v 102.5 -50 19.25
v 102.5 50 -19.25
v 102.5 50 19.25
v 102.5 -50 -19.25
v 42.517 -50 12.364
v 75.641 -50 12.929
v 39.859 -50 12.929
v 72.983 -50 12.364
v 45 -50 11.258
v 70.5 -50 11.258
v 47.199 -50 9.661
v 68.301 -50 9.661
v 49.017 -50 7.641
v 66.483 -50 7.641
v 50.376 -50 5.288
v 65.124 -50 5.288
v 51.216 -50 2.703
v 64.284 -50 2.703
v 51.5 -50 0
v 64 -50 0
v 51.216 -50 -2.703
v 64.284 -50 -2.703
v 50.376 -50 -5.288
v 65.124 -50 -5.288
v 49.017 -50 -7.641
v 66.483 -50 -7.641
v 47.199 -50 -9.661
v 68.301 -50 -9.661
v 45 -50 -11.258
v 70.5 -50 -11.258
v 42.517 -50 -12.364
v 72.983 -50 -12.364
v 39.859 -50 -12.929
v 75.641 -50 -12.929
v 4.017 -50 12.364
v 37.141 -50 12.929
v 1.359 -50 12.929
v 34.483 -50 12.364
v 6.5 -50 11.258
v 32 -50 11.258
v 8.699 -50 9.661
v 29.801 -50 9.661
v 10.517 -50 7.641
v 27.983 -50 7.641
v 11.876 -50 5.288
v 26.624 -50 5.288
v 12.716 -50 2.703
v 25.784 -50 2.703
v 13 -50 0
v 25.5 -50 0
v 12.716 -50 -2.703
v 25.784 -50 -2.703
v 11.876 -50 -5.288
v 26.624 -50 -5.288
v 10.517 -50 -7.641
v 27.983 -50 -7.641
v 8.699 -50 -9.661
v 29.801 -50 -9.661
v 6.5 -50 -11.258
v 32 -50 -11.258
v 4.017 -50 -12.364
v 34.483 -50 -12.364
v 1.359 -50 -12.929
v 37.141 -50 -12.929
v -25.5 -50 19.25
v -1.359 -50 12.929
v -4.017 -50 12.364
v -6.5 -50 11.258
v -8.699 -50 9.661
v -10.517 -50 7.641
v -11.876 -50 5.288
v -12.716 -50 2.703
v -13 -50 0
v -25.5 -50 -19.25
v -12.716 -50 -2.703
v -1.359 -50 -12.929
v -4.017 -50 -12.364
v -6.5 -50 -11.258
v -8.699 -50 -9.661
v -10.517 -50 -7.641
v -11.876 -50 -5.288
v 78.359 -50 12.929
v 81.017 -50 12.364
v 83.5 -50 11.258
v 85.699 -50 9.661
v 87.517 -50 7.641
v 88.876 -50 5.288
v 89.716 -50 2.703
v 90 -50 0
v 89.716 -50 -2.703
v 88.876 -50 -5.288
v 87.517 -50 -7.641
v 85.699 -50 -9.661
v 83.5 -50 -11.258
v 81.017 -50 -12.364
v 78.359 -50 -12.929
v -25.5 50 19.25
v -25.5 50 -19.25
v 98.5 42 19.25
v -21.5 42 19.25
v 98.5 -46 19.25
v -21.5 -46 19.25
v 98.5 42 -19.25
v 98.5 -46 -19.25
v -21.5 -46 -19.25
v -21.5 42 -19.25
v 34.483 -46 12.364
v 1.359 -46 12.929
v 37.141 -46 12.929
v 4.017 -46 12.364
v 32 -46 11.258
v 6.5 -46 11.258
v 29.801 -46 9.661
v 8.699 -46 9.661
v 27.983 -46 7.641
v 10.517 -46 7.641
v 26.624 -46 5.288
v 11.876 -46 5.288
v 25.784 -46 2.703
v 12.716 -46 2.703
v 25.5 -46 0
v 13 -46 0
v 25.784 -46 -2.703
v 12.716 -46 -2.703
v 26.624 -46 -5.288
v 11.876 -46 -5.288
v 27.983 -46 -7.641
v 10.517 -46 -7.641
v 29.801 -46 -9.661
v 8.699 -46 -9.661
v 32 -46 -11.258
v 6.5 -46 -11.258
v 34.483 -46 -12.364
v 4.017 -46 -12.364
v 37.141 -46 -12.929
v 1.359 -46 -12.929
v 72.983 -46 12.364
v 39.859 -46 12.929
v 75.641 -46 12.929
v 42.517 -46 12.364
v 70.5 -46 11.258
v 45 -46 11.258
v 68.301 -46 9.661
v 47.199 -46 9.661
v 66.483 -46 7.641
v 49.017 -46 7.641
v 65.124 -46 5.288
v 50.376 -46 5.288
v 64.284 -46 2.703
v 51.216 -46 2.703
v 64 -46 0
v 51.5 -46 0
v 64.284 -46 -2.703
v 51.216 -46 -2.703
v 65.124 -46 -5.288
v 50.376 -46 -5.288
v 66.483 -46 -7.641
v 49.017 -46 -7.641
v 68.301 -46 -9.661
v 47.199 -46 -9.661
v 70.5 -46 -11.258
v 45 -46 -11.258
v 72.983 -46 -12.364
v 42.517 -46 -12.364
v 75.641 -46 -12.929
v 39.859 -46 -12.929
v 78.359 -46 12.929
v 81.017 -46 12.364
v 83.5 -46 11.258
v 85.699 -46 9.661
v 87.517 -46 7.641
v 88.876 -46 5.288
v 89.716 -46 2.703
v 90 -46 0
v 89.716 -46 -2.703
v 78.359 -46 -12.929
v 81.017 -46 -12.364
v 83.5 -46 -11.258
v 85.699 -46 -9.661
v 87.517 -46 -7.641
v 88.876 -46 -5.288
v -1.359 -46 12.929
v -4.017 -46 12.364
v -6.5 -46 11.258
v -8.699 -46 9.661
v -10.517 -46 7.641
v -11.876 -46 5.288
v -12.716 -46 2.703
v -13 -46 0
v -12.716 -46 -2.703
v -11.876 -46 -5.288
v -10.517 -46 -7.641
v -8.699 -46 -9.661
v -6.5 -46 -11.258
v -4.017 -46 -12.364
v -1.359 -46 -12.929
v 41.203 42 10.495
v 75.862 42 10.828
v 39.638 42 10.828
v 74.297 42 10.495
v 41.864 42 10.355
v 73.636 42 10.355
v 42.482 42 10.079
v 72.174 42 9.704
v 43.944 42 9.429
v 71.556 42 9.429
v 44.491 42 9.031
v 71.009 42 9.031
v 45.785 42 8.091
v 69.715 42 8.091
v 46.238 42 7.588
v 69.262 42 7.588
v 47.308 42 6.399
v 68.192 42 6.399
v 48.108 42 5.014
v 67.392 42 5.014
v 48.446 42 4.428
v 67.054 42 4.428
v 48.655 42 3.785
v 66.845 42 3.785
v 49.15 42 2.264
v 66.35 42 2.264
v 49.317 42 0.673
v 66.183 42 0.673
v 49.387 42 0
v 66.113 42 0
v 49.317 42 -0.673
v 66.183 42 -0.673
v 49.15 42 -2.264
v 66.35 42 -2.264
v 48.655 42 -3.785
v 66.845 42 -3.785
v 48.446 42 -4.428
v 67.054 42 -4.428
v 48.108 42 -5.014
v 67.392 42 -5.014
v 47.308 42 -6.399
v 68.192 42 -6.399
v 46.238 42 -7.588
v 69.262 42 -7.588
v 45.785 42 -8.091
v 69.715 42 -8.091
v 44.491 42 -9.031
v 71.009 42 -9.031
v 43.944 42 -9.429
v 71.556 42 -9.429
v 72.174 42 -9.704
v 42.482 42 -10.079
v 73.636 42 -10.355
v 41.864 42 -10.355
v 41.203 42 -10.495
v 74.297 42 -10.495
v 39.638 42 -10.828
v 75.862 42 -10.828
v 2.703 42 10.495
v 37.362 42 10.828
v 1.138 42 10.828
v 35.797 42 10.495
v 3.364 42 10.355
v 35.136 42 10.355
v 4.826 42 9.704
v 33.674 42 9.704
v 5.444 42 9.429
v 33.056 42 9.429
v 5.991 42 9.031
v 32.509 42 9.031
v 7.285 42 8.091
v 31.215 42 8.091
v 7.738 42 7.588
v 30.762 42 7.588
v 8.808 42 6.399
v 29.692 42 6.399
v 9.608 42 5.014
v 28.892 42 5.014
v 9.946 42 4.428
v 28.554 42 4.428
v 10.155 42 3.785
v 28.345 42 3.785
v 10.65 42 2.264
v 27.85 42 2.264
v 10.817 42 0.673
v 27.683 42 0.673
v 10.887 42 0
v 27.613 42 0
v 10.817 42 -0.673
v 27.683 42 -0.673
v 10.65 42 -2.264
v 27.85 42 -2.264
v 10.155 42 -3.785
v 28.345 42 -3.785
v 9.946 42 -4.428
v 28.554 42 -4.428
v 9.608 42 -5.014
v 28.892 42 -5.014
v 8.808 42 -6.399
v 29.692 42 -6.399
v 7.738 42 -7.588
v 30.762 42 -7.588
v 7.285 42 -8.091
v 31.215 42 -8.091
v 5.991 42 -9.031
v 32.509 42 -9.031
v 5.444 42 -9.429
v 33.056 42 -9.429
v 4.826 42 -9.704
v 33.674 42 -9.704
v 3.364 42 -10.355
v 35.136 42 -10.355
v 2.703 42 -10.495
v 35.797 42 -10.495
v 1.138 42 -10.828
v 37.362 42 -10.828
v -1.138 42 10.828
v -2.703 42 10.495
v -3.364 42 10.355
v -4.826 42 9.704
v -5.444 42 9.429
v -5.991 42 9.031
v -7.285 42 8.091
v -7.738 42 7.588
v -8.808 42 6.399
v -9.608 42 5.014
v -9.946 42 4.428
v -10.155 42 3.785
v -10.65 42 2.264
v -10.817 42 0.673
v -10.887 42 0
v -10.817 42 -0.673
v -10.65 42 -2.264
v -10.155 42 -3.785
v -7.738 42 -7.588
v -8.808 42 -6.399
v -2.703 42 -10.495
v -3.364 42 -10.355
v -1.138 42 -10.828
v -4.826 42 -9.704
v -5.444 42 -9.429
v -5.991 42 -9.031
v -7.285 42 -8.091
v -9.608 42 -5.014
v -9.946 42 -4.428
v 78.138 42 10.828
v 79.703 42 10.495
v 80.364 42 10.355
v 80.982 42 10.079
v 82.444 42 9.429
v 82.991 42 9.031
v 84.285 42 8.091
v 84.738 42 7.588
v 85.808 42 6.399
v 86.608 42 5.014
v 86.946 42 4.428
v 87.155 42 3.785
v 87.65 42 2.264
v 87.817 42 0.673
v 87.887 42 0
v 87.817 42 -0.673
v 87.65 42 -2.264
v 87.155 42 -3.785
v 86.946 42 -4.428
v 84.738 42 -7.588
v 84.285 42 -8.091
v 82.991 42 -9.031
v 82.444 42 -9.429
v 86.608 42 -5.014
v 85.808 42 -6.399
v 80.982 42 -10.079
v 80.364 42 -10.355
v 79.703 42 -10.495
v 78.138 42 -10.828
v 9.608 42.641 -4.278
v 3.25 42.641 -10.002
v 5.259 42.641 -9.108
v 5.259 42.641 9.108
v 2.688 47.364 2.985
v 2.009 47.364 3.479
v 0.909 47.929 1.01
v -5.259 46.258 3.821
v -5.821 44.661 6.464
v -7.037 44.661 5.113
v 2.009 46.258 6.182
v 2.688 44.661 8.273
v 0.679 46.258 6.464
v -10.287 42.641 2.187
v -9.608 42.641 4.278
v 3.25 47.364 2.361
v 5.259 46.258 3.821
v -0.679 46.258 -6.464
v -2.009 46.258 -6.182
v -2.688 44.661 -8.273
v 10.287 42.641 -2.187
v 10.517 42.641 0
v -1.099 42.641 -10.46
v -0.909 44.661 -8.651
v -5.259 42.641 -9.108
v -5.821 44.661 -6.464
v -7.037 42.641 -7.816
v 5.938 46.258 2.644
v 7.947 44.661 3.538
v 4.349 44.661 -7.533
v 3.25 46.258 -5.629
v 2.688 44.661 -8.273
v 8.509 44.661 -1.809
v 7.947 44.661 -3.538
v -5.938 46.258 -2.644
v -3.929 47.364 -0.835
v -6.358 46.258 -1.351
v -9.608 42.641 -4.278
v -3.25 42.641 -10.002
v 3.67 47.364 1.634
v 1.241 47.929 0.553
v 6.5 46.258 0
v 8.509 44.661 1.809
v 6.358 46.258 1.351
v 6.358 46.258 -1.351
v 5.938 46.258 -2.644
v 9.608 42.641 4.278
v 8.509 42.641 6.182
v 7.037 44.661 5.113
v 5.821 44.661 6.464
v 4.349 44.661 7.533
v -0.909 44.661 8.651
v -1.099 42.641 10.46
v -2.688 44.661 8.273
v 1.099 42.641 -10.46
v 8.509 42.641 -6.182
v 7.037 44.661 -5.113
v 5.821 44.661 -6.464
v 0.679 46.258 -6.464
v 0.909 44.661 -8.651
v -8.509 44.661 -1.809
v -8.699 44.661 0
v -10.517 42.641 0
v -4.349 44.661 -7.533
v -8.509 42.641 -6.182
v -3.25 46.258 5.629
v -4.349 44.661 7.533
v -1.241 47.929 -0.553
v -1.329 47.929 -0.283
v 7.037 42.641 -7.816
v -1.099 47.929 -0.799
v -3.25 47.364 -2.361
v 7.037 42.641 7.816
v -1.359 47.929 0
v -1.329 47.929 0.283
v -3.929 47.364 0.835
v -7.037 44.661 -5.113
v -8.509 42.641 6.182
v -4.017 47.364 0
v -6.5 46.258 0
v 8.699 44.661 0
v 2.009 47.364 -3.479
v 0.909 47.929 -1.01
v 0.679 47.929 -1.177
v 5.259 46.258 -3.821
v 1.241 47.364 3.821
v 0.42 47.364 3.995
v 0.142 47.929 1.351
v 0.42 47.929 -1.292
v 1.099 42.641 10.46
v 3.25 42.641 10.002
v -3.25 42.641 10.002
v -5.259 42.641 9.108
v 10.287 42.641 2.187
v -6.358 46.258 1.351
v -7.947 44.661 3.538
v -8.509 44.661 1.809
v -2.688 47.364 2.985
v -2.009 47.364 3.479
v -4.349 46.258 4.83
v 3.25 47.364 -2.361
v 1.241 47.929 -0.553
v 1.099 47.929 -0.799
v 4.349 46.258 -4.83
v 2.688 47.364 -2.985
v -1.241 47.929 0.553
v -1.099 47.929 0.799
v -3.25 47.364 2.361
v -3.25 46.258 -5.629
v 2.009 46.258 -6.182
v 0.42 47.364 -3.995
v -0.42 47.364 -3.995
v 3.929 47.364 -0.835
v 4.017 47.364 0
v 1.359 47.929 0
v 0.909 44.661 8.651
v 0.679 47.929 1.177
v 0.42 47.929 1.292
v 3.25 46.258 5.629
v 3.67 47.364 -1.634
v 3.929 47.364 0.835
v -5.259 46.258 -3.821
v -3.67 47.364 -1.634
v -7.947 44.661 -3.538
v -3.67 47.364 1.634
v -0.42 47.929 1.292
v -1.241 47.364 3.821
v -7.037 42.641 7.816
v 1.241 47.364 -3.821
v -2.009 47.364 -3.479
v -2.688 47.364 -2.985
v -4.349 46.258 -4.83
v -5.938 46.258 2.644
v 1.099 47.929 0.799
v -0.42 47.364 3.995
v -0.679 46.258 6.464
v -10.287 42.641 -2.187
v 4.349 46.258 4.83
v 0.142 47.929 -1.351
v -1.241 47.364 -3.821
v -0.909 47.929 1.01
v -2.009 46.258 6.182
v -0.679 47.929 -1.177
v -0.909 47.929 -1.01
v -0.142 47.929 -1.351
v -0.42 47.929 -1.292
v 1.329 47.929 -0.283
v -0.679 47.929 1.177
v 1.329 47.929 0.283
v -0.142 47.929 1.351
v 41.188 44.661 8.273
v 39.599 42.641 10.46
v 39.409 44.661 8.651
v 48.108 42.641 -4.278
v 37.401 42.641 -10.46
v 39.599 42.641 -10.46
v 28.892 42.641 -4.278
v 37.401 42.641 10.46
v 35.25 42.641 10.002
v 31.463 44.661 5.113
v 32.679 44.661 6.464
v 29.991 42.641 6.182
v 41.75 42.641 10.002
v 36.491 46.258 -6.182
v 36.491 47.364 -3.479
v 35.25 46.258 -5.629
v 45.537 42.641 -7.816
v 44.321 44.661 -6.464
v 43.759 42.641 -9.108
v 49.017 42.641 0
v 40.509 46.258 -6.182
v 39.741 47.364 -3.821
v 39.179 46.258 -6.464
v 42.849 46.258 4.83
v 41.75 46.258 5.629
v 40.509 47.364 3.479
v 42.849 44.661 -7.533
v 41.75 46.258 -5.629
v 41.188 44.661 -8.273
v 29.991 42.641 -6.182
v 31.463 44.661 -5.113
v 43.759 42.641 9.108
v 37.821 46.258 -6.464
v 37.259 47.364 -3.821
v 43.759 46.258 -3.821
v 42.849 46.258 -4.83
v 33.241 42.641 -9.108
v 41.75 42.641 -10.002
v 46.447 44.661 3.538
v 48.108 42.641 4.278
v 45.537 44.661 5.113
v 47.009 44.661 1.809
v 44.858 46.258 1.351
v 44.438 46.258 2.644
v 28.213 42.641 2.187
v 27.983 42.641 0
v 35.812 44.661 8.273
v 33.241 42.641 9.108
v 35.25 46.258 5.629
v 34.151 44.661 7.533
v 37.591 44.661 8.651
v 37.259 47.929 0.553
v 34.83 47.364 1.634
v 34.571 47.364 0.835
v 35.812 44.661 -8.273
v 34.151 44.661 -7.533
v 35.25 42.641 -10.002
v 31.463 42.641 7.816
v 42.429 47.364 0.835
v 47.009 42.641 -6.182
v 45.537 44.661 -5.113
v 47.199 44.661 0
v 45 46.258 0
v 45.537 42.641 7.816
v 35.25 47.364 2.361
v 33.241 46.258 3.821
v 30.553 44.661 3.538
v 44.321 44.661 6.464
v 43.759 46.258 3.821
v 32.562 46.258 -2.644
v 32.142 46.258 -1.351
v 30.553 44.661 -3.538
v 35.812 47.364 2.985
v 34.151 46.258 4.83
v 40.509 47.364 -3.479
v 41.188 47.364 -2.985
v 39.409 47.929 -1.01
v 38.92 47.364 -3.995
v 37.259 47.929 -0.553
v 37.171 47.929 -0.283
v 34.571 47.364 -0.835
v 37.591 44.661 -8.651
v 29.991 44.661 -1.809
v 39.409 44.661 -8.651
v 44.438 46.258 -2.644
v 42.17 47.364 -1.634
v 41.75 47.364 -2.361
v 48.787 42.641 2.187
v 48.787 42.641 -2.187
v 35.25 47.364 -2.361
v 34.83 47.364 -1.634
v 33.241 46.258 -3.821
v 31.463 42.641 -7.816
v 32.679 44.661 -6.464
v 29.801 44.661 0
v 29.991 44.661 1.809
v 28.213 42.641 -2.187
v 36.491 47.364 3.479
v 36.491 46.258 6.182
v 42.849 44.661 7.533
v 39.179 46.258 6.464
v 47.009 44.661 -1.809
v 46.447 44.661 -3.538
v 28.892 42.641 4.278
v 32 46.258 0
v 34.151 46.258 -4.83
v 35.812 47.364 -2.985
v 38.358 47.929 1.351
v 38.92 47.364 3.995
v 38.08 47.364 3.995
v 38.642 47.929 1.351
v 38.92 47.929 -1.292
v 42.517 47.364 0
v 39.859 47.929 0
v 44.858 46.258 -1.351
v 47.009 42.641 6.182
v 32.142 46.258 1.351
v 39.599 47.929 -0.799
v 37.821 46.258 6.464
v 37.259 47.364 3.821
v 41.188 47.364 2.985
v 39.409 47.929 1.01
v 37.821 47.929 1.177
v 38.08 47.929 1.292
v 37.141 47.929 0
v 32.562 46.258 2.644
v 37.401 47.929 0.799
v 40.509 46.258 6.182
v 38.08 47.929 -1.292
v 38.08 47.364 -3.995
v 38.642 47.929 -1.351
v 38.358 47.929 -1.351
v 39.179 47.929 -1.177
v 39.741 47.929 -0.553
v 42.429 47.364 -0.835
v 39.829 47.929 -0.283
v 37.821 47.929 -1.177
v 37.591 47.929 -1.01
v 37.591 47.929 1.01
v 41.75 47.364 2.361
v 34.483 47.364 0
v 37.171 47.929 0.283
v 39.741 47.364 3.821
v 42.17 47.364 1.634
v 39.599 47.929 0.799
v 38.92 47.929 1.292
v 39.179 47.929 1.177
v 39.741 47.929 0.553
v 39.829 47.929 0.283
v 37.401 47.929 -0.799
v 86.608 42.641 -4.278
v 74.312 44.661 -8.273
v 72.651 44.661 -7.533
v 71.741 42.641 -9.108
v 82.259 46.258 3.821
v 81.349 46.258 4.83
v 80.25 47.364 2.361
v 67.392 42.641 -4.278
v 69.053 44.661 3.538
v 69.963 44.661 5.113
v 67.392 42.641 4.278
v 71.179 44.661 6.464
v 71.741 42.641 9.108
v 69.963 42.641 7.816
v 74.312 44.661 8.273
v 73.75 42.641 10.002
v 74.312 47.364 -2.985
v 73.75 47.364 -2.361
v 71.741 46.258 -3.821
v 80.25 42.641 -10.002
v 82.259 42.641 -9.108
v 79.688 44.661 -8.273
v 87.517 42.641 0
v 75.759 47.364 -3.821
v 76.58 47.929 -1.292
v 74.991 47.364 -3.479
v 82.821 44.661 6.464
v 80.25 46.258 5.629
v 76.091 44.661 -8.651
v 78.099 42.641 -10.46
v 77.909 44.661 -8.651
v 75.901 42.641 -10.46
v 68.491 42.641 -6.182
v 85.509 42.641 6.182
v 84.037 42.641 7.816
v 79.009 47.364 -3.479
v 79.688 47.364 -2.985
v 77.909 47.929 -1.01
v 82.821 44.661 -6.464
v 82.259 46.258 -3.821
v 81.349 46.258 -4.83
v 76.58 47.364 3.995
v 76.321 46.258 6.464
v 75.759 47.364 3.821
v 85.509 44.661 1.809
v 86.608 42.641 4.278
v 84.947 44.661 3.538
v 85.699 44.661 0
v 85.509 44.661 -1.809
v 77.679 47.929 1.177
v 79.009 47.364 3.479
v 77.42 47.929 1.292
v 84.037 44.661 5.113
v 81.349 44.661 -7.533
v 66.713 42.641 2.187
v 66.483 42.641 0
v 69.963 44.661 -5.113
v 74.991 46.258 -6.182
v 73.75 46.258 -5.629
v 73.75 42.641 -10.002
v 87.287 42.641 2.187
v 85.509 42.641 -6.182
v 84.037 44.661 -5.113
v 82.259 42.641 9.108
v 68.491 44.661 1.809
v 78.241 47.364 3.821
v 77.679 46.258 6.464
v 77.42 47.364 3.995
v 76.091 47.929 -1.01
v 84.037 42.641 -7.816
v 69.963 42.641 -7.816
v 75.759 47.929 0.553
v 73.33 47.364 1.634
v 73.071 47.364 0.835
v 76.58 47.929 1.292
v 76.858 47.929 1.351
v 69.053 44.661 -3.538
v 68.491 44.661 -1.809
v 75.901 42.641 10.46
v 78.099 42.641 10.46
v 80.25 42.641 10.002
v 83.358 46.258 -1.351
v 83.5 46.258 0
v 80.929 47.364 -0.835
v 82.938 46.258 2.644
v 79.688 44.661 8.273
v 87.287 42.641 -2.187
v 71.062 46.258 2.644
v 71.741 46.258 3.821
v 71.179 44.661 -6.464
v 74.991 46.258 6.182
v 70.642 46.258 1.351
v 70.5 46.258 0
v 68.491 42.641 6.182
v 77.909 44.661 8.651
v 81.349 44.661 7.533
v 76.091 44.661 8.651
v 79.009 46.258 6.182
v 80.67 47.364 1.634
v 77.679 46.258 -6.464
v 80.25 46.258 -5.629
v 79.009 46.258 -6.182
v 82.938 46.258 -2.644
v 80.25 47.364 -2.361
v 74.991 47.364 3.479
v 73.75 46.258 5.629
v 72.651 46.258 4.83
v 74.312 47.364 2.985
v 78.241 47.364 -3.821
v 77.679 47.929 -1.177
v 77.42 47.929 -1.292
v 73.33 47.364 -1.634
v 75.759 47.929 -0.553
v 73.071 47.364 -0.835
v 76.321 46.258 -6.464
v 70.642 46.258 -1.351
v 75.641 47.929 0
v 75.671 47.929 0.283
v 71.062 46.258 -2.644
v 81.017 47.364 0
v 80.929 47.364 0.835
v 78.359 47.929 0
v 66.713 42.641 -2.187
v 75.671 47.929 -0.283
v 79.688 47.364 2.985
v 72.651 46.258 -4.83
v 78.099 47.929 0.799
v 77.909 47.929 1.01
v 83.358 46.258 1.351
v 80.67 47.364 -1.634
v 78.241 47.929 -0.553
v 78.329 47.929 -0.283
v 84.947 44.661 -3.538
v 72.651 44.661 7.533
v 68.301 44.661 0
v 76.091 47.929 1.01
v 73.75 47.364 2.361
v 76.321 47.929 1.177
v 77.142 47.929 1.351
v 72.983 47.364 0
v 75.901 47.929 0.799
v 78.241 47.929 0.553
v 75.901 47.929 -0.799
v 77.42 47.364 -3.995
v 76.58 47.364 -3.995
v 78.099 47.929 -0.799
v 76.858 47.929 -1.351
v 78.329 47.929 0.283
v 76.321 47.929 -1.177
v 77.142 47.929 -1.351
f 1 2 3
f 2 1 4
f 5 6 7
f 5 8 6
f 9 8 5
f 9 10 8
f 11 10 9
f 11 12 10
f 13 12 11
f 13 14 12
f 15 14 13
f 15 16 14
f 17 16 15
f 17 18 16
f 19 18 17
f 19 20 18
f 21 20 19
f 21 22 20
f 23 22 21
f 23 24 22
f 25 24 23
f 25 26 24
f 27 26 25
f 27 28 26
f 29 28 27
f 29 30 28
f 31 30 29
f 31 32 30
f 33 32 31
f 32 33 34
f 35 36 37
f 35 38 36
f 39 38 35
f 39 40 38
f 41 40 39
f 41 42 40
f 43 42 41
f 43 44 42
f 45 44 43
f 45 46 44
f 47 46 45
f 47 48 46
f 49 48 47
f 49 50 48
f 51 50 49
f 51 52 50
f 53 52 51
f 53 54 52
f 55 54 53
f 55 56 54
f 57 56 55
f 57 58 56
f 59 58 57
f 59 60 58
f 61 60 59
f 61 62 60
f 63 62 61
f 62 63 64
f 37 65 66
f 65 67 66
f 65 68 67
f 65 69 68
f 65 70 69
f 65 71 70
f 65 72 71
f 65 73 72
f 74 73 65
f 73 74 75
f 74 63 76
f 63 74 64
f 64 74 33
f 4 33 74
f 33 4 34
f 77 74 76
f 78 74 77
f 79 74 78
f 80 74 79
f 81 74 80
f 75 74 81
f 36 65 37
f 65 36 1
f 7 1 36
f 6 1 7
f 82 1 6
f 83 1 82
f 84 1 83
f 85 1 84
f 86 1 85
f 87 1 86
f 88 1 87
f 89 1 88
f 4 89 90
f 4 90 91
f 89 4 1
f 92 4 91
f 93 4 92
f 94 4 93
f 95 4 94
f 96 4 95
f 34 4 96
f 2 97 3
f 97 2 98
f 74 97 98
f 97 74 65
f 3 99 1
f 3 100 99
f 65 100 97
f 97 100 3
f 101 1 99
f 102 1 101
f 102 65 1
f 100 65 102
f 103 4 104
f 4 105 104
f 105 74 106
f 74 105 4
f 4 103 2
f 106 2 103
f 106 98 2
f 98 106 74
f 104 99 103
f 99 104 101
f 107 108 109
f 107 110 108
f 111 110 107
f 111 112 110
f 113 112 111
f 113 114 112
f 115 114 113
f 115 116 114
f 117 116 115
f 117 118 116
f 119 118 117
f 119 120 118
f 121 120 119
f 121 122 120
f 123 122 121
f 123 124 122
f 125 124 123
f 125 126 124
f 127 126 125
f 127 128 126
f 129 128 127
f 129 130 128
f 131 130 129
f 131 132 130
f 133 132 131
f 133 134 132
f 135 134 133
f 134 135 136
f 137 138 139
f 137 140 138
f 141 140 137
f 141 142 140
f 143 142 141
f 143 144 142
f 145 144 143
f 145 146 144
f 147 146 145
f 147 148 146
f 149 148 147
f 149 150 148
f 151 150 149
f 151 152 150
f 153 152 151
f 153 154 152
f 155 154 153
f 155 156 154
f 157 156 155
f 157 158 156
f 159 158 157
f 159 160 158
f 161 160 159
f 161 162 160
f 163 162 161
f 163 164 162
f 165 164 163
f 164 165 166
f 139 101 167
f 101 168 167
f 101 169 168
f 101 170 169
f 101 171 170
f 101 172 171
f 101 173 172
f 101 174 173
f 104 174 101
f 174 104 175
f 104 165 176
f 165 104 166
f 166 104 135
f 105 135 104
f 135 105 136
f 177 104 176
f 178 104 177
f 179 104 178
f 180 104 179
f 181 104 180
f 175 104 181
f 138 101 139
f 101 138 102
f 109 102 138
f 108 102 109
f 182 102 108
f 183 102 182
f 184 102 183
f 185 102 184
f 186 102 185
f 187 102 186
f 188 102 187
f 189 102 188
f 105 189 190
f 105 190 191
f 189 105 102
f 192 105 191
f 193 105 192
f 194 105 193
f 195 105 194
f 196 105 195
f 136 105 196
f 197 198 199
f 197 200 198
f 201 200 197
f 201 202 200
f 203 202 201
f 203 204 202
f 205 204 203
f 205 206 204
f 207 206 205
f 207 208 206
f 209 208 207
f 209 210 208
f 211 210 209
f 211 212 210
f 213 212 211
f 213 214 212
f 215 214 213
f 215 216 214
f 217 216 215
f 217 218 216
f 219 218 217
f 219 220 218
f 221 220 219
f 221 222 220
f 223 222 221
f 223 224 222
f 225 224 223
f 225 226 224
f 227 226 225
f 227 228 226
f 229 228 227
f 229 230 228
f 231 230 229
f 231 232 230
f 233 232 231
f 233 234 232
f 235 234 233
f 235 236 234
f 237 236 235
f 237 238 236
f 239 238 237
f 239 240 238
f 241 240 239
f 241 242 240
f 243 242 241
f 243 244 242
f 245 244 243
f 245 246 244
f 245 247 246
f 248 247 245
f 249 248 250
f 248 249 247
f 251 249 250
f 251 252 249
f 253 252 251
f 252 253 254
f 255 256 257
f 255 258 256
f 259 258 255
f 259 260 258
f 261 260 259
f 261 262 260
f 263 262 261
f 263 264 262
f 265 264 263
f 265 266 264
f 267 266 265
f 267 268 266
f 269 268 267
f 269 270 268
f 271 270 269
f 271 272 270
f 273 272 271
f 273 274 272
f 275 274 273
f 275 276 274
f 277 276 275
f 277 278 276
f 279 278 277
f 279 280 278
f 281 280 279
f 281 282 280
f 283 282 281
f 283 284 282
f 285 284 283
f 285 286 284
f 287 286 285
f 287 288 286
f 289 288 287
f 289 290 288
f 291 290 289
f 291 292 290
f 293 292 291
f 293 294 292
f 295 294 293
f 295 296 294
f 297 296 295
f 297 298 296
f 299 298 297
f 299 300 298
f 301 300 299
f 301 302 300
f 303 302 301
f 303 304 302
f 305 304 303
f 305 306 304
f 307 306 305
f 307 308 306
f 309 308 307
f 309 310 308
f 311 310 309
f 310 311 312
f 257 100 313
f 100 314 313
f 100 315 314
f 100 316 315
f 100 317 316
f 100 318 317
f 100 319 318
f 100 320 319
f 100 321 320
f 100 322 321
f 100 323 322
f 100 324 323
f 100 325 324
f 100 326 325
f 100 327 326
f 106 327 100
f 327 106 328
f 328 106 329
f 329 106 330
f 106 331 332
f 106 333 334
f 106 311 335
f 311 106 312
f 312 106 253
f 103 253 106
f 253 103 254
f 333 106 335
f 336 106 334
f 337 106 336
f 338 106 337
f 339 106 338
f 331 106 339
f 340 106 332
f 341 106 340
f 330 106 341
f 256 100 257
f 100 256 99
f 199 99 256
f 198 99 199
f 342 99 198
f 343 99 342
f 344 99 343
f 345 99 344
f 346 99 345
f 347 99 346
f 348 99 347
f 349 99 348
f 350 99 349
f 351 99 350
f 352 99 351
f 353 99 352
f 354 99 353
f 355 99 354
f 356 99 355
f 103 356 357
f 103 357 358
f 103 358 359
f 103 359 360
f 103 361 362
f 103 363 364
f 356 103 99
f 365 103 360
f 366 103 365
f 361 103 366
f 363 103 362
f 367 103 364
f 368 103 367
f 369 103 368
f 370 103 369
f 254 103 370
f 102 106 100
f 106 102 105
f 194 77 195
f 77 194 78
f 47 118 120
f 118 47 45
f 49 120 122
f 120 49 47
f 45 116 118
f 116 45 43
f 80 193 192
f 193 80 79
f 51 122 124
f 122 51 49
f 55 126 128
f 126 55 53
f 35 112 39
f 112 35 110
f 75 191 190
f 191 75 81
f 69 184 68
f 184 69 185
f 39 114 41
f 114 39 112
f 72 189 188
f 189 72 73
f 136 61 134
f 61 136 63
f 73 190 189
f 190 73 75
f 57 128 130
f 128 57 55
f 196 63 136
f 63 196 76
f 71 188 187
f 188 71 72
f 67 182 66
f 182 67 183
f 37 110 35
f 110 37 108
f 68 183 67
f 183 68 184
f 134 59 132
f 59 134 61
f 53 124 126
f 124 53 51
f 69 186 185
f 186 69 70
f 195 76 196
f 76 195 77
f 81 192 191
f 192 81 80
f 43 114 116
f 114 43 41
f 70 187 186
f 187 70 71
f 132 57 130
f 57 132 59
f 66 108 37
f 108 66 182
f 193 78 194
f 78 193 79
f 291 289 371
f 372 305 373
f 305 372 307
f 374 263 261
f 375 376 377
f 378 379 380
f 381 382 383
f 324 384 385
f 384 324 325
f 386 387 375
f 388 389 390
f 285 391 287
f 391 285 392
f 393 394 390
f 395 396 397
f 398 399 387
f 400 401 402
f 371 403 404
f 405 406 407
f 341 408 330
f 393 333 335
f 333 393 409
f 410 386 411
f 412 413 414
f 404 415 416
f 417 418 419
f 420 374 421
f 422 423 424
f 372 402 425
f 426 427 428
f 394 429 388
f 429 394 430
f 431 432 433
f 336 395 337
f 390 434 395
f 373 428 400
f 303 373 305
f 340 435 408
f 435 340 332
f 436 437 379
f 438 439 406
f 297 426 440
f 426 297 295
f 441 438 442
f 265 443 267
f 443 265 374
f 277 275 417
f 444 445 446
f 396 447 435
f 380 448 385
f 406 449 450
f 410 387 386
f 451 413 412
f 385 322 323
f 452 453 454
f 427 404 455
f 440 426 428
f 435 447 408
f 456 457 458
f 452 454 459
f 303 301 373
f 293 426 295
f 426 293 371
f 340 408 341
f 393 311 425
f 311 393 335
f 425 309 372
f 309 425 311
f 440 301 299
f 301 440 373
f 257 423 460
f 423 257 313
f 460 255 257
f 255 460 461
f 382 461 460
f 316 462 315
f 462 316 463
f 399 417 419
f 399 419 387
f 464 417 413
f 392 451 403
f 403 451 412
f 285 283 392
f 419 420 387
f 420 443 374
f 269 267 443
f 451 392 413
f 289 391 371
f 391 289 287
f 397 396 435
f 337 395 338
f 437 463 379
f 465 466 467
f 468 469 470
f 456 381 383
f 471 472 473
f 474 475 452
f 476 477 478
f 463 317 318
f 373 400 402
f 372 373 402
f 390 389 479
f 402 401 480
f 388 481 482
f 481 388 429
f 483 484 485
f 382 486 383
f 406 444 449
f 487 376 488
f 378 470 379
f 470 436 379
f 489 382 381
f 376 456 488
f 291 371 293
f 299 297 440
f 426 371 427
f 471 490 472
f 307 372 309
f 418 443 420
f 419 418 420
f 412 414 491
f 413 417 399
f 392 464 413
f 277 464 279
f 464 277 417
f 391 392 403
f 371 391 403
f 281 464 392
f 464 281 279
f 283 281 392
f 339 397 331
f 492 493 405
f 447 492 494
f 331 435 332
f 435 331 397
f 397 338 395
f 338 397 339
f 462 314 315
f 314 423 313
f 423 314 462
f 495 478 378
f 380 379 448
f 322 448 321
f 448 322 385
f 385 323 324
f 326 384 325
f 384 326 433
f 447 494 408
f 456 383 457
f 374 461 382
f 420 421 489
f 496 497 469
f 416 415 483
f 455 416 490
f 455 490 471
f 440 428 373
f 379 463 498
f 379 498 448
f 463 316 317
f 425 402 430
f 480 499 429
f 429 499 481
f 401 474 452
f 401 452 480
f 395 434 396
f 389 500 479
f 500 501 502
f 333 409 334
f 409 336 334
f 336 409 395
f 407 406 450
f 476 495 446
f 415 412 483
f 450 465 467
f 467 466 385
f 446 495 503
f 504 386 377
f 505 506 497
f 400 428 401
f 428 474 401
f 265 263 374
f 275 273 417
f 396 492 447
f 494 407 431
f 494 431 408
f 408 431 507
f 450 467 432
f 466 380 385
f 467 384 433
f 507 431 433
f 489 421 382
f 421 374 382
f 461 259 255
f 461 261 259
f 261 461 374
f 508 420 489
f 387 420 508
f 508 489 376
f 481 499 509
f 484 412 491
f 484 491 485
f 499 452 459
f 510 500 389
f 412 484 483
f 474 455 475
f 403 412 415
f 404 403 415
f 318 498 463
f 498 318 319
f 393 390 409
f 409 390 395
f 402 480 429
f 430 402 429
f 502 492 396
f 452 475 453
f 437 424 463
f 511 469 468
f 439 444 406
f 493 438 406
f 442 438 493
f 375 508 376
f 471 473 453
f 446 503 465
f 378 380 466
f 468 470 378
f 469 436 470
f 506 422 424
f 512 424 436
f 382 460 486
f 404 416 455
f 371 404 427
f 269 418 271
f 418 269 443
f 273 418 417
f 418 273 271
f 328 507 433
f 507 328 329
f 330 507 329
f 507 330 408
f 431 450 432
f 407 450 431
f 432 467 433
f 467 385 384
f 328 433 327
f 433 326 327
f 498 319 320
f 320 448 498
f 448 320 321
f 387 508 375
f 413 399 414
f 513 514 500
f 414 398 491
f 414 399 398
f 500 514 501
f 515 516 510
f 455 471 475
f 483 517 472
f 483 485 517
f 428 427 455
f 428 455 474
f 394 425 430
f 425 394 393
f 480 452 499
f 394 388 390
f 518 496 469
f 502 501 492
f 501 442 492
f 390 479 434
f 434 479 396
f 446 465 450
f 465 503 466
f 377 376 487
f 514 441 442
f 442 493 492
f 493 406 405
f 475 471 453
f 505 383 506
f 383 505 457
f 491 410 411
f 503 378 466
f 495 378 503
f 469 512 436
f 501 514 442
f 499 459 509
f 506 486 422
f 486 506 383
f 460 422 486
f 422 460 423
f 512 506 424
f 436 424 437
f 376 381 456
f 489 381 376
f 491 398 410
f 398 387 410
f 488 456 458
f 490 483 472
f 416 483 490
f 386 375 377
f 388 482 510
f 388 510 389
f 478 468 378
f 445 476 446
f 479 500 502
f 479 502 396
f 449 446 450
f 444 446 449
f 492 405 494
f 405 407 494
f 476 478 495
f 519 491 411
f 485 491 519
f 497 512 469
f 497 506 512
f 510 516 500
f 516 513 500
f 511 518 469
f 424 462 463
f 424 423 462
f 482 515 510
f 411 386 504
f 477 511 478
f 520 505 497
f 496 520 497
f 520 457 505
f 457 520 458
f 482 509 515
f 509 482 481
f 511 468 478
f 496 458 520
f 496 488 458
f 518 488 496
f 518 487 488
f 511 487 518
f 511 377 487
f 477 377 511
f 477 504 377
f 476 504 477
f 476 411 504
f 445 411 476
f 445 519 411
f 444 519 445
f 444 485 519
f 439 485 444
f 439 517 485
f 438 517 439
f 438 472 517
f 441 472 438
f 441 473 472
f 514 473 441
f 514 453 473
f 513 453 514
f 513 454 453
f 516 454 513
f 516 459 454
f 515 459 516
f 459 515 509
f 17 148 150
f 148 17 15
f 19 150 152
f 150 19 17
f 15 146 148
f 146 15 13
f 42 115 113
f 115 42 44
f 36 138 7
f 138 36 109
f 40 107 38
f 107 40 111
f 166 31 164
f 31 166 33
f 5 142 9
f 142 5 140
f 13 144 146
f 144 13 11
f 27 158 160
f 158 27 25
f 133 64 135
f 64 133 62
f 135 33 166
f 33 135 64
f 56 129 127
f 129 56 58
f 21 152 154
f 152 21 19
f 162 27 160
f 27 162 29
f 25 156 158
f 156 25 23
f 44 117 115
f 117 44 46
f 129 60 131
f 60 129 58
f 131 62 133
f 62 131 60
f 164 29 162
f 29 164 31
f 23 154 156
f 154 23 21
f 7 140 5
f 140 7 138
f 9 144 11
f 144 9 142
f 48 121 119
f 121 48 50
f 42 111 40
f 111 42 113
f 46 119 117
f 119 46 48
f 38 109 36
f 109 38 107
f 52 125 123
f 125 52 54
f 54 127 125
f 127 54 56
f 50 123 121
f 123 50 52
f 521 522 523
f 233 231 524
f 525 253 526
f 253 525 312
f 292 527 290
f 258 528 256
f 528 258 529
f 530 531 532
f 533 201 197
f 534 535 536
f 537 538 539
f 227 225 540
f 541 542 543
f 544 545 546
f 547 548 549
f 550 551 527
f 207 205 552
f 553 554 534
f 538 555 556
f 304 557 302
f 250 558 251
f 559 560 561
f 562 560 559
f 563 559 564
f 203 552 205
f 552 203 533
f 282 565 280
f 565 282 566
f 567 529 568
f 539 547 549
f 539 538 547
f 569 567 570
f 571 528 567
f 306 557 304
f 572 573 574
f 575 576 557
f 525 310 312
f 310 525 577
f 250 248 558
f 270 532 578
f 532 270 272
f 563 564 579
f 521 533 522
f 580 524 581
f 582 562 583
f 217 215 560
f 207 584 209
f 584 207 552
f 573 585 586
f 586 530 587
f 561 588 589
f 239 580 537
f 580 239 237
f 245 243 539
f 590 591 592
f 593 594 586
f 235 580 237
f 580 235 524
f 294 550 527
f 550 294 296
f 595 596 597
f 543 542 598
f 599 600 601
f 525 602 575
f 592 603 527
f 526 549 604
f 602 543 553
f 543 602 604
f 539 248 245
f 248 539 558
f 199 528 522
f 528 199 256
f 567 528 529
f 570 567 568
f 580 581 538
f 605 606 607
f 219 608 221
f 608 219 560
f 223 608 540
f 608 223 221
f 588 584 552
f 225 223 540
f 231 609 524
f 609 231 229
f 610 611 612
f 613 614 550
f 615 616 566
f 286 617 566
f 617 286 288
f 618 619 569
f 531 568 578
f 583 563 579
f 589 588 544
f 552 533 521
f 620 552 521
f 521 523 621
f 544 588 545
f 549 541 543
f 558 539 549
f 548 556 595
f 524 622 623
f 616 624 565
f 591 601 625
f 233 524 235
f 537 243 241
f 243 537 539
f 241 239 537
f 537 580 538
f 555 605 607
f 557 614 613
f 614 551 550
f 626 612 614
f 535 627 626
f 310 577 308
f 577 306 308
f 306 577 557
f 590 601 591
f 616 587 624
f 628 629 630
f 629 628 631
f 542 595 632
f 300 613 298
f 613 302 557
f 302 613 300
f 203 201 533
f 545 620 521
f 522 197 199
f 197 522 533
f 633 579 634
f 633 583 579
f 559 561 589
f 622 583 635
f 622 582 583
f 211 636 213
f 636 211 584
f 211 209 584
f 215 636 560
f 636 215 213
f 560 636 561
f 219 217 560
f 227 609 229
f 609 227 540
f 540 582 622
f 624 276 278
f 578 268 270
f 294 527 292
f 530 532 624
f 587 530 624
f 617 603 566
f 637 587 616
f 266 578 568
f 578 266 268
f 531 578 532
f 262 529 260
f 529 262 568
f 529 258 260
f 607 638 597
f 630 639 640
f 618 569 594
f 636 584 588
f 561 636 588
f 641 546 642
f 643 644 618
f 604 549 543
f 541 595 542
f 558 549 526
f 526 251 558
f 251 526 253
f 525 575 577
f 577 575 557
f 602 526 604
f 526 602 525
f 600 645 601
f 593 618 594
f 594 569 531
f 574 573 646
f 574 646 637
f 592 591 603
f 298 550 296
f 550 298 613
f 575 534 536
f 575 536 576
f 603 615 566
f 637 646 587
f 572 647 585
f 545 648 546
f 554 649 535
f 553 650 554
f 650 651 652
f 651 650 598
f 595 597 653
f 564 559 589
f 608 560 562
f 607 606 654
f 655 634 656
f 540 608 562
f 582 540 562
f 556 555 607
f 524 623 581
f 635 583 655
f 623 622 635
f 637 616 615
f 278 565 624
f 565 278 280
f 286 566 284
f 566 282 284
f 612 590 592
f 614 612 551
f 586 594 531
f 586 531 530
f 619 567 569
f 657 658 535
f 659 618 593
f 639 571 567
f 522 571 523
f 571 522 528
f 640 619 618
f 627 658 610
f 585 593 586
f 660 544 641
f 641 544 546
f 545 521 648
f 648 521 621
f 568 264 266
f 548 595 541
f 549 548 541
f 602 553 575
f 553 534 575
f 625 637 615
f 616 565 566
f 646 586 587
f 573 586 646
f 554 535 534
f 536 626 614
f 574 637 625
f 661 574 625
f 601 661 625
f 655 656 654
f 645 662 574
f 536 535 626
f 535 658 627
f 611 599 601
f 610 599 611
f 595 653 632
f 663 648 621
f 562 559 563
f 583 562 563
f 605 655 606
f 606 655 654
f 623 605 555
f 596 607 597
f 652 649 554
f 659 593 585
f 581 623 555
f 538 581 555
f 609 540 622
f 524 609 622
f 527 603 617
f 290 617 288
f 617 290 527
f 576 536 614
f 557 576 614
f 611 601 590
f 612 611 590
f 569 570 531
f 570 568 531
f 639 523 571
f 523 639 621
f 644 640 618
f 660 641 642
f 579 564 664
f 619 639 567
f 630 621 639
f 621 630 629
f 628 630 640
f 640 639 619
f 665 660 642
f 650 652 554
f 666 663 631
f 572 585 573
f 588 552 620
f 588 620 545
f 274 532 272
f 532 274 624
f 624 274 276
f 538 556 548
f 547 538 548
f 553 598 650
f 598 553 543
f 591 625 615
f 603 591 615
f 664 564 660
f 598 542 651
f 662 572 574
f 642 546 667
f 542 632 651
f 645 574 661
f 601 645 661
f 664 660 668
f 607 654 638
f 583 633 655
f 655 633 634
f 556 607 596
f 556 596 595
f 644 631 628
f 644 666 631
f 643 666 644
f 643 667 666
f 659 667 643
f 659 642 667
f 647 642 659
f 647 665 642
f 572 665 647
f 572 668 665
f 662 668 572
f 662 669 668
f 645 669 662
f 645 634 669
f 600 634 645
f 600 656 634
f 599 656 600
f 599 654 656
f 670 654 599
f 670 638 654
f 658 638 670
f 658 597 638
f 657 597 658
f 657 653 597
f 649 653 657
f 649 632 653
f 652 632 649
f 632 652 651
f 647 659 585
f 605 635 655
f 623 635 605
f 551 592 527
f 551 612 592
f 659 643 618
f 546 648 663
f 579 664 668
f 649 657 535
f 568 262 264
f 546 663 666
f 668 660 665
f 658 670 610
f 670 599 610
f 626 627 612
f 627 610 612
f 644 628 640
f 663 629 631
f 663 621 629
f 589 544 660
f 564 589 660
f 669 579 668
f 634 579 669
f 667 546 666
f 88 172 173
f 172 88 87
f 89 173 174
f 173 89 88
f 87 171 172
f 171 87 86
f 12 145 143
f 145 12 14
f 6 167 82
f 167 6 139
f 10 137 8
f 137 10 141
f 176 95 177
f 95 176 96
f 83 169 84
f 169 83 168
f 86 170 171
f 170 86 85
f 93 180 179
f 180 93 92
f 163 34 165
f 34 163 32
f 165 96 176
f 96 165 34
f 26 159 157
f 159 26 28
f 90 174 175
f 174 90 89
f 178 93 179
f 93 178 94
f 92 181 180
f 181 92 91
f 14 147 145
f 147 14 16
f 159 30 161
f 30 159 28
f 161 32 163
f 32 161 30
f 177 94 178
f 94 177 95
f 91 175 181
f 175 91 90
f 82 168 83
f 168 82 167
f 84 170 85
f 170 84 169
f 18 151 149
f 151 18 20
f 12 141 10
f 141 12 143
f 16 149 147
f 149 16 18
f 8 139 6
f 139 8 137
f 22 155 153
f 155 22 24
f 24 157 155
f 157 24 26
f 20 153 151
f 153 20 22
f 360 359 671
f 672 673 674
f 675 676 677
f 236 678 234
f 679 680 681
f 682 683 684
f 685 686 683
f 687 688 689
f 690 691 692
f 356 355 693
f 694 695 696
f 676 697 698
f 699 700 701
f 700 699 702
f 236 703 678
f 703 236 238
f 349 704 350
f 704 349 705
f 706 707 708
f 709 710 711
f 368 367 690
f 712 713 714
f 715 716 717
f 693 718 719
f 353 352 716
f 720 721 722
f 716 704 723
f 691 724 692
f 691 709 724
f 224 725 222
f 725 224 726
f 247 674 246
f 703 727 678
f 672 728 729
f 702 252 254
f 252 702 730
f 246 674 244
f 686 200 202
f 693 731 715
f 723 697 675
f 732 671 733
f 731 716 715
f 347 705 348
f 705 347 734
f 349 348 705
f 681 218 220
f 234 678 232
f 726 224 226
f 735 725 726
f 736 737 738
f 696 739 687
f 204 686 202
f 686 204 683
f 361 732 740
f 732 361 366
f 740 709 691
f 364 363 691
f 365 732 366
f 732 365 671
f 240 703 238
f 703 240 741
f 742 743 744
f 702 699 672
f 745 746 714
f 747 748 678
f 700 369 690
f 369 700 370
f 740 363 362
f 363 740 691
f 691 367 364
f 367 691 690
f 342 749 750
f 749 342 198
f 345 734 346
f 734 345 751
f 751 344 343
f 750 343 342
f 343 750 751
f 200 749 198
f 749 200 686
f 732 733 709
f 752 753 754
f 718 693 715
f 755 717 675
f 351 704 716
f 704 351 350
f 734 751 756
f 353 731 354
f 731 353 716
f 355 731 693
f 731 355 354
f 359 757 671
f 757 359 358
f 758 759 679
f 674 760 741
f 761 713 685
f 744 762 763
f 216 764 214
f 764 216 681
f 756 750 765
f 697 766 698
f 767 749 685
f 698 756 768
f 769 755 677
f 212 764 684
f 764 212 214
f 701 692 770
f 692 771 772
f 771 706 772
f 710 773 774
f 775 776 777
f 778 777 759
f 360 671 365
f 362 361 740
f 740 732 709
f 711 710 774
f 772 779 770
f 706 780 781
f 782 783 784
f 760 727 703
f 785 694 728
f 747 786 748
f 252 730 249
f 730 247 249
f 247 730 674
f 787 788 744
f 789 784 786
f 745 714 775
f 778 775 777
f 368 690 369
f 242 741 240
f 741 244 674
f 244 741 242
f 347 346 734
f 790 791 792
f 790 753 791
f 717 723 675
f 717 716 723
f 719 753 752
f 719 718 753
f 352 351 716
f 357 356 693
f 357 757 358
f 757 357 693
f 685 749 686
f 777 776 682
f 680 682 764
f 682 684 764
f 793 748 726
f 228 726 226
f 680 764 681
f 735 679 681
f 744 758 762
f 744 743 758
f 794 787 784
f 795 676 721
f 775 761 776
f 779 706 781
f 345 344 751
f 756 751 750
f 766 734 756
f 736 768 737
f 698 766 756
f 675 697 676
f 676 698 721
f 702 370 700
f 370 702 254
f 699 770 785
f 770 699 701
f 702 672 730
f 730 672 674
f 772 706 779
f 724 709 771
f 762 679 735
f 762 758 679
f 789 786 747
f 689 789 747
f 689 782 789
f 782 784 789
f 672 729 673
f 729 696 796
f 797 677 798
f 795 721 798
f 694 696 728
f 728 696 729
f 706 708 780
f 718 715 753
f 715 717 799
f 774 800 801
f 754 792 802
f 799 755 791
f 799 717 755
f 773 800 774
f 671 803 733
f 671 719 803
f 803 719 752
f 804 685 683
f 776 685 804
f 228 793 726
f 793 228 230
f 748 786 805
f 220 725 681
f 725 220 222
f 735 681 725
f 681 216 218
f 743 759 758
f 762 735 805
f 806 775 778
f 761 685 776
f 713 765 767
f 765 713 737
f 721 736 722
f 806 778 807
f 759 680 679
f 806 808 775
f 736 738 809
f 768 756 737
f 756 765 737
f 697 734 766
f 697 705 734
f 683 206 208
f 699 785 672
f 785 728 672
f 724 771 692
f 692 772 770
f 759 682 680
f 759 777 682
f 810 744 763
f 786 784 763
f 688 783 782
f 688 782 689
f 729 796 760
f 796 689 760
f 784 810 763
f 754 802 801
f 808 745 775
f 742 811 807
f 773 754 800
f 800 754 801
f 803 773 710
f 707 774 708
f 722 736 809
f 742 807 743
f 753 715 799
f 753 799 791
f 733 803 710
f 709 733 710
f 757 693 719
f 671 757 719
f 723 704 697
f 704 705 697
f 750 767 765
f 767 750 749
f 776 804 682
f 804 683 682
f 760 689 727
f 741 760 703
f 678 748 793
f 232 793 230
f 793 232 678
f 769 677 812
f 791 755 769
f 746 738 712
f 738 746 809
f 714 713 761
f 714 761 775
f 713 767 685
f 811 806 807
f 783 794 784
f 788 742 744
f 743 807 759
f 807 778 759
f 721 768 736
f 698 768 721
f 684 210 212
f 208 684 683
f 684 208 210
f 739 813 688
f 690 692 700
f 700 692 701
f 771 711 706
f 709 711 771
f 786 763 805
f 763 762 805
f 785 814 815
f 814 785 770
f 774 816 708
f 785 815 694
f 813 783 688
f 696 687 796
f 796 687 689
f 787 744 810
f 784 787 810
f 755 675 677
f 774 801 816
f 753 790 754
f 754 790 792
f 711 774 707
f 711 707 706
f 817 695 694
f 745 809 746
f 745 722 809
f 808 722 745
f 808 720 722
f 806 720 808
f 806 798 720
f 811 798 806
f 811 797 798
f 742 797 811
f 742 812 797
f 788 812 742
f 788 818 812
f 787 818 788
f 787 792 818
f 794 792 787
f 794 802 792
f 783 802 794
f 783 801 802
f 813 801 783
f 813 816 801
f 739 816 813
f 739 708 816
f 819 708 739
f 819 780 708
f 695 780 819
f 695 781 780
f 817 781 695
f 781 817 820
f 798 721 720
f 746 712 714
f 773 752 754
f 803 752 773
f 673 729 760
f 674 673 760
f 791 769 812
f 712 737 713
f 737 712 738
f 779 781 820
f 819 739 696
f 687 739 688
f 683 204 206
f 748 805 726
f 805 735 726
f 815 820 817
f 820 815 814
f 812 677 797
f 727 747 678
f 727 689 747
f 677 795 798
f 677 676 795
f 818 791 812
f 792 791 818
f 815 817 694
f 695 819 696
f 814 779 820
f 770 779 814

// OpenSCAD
stand_height=100;
stand_thickness=4;
stand_bottom_thickness=8;

//number of tubes in stand
tube_num=3;

//spacing between tubes
tube_spacing=12.5;

tube_cirumference=26;

//tube recession through bottom, less than bottom thickness is desirable
tube_recession = stand_bottom_thickness *0.75;

//makes tube stand
module maketubestand()
{
//rotates for good printing on FDM machines, might not be desirable for other machine-types
rotate([90,0,0])
	{
	difference()
		{
		tubestand();
		testtubes();
		}
	}
}

//creates the frame
module tubestand()
{
height = stand_height;
width = tube_cirumference + tube_spacing;
length = tube_num * (tube_cirumference + tube_spacing) + tube_spacing;
offset = (length/2) - (tube_spacing+(tube_cirumference/2));
heightoffset = stand_thickness + stand_bottom_thickness;

difference()
	{
	translate([offset, 0, 0])
	cube([length,width,height], center = true);
 
	translate([offset, stand_thickness, (heightoffset/2)-stand_thickness])
	cube([length-stand_thickness*2,width*2,height-heightoffset], center = true);
	}
}

//creates the tubes
module testtubes()
{
tube_radius = tube_cirumference/2;
offsetx = tube_cirumference+tube_spacing;
offsetz = stand_bottom_thickness + tube_radius - tube_recession ;

for (i = [0:tube_num-1])
	{
	translate([0,0,offsetz])
		{
		union()
			{
			translate([(offsetx*i), 0, 0])
			cylinder(r = tube_radius, h = stand_height, center = true);

			translate([(offsetx*i), 0, -(stand_height/2)])
			sphere(r = tube_radius, center = true);
			}
		}
	}
}

//initialises making of tubestand
maketubestand();
